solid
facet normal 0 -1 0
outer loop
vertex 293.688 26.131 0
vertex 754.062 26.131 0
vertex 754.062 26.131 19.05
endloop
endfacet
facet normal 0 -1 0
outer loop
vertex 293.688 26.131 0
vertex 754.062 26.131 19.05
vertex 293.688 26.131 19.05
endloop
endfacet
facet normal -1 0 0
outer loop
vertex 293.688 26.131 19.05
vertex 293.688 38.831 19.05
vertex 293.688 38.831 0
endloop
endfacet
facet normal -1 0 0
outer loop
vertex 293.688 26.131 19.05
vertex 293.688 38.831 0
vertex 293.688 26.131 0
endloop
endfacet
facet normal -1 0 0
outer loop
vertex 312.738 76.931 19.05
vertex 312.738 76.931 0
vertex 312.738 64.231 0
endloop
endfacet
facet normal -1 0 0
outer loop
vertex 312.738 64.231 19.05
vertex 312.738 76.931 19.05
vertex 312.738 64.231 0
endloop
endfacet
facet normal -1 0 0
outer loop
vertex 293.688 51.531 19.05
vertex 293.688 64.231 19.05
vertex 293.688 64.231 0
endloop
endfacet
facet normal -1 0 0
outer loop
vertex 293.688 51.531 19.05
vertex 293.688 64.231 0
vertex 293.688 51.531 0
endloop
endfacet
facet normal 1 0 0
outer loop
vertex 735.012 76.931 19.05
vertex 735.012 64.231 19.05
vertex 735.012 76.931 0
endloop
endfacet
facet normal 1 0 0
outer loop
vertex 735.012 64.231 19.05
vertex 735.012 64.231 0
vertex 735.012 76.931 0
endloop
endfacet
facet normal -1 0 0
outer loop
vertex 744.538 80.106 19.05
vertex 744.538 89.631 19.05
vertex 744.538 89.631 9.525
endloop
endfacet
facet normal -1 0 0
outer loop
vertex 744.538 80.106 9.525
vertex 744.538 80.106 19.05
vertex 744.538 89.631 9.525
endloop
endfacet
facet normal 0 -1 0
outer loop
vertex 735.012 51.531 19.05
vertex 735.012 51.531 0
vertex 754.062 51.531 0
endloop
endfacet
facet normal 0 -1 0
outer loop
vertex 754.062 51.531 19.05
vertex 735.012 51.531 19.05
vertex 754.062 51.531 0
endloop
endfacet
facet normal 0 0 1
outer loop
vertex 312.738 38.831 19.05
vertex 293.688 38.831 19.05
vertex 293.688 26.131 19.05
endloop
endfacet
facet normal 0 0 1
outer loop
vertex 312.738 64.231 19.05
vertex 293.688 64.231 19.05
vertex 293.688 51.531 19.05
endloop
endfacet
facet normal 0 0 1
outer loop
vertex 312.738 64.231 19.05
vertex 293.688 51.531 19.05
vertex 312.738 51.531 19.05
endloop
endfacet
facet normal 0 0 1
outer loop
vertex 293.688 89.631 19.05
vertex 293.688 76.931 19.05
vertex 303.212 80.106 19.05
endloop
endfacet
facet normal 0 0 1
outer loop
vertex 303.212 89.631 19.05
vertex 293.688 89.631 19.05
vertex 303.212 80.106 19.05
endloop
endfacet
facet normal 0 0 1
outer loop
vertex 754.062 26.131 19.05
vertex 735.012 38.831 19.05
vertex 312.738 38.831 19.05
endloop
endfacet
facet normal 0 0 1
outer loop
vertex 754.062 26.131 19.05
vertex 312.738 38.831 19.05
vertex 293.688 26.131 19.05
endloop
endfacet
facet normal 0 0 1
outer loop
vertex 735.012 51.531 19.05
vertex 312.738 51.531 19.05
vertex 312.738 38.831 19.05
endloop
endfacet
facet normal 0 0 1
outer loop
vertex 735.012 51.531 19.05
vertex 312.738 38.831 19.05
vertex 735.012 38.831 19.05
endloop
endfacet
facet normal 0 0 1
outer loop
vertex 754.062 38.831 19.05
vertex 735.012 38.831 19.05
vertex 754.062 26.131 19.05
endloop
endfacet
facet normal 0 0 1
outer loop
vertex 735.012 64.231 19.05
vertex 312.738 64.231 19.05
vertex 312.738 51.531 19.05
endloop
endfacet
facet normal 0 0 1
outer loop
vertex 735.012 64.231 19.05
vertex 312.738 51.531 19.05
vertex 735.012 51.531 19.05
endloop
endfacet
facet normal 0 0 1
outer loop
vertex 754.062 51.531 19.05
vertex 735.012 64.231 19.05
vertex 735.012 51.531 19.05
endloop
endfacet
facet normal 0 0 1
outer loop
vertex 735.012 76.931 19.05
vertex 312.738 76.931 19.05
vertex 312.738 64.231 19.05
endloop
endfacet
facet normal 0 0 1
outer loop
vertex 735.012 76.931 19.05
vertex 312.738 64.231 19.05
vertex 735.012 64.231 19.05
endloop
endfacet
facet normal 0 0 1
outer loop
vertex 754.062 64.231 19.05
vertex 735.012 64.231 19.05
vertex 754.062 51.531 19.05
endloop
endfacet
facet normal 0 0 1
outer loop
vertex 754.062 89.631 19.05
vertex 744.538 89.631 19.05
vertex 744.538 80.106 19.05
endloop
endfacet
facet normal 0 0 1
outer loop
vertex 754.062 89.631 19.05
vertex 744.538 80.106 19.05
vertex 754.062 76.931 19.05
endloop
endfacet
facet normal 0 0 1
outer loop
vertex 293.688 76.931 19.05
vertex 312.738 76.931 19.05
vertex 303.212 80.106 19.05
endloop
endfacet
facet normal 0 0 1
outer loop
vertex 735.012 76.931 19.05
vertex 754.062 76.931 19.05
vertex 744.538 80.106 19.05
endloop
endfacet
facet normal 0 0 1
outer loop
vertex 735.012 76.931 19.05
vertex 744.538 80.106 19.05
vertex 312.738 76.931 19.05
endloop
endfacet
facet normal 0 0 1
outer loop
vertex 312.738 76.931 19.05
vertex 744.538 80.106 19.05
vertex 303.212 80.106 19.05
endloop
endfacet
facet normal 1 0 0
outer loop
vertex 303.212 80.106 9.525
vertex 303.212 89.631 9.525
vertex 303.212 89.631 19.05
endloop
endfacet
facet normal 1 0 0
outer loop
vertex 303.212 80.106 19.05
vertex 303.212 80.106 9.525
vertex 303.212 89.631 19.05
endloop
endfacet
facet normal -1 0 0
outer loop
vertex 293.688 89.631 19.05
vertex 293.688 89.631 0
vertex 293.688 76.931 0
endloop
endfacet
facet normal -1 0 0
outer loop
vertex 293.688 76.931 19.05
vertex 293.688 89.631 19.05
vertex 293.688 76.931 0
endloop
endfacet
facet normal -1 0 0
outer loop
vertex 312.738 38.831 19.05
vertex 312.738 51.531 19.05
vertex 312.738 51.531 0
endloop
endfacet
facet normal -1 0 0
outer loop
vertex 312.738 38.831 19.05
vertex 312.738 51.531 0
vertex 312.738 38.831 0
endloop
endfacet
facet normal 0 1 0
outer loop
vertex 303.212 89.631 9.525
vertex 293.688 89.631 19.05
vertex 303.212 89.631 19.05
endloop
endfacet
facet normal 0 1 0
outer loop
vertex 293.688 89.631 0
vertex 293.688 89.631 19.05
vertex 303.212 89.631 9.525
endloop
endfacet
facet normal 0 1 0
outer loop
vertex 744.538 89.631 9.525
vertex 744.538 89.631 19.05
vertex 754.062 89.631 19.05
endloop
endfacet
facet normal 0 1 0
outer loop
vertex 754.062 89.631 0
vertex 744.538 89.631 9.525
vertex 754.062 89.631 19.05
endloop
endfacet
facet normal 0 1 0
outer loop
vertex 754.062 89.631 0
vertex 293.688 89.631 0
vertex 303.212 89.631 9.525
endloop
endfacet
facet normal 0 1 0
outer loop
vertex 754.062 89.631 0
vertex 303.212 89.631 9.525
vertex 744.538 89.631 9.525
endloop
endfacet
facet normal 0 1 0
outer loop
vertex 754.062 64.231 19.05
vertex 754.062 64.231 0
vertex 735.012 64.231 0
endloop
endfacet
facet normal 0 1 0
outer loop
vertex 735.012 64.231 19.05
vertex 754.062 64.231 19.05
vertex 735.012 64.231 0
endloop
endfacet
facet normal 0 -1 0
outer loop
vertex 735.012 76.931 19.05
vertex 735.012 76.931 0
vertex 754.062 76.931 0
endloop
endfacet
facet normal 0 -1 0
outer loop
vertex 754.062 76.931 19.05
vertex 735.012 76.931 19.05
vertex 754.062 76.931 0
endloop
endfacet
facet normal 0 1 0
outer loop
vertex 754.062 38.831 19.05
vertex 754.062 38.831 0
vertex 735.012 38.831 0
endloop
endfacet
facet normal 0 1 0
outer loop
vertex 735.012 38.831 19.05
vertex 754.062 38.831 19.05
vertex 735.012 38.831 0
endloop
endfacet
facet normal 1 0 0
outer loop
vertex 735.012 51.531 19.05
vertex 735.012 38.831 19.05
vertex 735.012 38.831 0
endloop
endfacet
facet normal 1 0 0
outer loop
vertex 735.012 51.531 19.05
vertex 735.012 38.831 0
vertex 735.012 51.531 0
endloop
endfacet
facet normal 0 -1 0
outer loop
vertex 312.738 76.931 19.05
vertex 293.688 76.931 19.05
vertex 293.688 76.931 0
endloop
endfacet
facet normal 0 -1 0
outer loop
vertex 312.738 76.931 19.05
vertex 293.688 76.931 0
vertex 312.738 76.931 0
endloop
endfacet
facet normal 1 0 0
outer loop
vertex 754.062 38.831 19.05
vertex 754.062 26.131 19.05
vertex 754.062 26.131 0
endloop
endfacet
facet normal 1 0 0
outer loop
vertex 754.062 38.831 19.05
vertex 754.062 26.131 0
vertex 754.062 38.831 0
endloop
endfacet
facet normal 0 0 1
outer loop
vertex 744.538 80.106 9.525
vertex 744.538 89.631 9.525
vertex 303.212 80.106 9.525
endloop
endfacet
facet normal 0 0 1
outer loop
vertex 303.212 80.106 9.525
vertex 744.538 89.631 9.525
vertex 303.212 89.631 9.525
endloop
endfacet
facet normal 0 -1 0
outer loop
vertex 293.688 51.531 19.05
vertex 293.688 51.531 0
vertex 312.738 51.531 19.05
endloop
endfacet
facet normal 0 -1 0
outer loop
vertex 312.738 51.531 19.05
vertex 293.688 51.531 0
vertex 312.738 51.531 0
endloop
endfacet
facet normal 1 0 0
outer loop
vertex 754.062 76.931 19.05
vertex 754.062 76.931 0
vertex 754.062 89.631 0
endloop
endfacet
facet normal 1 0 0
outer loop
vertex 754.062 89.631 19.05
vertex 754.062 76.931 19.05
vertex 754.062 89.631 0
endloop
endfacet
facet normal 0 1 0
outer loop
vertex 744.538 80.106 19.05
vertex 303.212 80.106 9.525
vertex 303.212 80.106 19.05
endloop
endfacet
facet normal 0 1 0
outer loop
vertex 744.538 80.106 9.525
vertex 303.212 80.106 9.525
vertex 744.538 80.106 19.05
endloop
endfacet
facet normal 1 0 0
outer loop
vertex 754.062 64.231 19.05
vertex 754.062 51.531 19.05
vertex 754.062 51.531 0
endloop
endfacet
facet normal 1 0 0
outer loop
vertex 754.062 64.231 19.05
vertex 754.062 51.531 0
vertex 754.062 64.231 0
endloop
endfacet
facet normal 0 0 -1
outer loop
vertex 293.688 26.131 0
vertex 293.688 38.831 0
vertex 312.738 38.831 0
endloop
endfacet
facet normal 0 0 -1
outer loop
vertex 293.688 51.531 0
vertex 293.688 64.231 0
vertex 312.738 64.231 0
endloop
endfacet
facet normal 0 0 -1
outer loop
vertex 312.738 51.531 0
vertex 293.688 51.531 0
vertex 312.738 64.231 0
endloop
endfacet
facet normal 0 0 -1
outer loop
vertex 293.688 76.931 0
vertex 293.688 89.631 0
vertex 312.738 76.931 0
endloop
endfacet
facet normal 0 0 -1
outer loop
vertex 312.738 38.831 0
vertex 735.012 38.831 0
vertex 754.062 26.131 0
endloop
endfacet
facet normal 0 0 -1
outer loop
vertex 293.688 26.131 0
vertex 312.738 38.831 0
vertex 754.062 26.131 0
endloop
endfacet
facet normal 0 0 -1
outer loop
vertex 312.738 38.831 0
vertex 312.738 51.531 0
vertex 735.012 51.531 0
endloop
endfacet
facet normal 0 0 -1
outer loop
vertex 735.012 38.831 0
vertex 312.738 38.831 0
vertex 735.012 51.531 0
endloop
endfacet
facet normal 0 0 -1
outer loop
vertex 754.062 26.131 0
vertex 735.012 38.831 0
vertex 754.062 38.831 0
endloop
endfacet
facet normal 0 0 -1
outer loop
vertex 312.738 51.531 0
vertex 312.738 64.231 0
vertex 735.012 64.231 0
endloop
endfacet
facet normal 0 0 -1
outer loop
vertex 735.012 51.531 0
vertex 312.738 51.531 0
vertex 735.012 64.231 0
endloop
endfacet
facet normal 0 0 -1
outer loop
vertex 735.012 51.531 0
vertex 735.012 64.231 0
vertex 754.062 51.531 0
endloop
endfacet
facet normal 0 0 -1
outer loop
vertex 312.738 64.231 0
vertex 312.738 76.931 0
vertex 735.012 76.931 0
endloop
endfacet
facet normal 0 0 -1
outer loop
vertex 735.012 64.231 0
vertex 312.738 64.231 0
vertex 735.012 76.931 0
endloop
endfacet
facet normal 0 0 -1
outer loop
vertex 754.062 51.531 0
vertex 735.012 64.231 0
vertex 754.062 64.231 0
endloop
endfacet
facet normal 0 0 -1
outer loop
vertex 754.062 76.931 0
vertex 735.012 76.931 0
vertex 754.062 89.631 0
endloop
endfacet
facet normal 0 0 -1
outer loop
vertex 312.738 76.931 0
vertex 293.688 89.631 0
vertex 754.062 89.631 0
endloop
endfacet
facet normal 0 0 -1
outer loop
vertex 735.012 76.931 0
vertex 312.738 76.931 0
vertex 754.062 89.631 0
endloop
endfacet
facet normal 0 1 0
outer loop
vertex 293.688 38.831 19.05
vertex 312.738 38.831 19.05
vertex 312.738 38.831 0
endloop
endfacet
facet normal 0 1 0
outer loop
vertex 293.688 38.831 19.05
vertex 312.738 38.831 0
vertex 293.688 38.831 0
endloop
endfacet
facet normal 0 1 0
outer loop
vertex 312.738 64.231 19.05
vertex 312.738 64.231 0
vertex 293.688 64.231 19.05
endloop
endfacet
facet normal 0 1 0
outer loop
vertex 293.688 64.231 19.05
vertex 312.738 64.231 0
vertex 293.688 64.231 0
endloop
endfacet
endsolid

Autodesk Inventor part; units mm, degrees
ref_plane "YZ Plane" through (0, 0, 0) normal (1, 0, 0) x (0, 1, 0)
ref_plane "XZ Plane" through (0, 0, 0) normal (0, 1, 0) x (-1, 0, 0)
ref_plane "XY Plane" through (0, 0, 0) normal (0, 0, 1) x (1, 0, 0)
sketch "Sketch1" plane through (0, 0, 0) normal (0, 0, 1) x (1, 0, 0)
  line L0 (293.6875, 89.6306) -> (523.875, 89.6306)
  line L1 (523.875, 89.6306) -> (523.875, 26.1306)
  line L2 (523.875, 26.1306) -> (293.6875, 26.1306)
  line L3 (293.6875, 89.6306) -> (293.6875, 76.9306)
  line L4 (293.6875, 76.9306) -> (274.6375, 76.9306)
  line L5 (274.6375, 76.9306) -> (274.6375, 64.2306)
  line L6 (274.6375, 64.2306) -> (293.6875, 64.2306)
  line L7 (293.6875, 64.2306) -> (293.6875, 51.5306)
  line L8 (293.6875, 51.5306) -> (274.6375, 51.5306)
  line L9 (274.6375, 51.5306) -> (274.6375, 38.8306)
  line L10 (274.6375, 38.8306) -> (293.6875, 38.8306)
  line L11 (293.6875, 38.8306) -> (293.6875, 26.1306)
  line L12 (293.6875, 76.9306) -> (312.7375, 76.9306)
  line L13 (312.7375, 76.9306) -> (312.7375, 64.2306)
  line L14 (312.7375, 64.2306) -> (293.6875, 64.2306)
  line L15 (293.6875, 51.5306) -> (312.7375, 51.5306)
  line L16 (312.7375, 51.5306) -> (312.7375, 38.8306)
  line L17 (312.7375, 38.8306) -> (293.6875, 38.8306)
  point P0 (0, 0)
  dimension "d4" = 63.5
  dimension "d17" = 230.1875
  dimension "d18" = 19.05
  dimension "d19" = 12.7
  dimension "d20" = 12.7
  dimension "d21" = 12.7
  dimension "d22" = 12.7
  dimension "d23" = 12.7
  dimension "d24" = 0
  dimension "d28" = 0
extrude "Extrusion4" add sketch "Sketch1" along normal blind 19.05 contours L0 L1 L2 L11 L17 L16 L15 L7 L14 L13 L12 L3
mirror "Mirror2" about plane through (523.875, 26.1306, 0) normal (1, 0, 0) of "Extrusion4"
sketch "Sketch4" plane through (293.6875, 89.6306, 19.05) normal (0, 1, 0) x (1, 0, 0)
  line L0 (0, 19.05) -> (0, 0) projected
  line L1 (0, 0) -> (460.375, 0) projected
  line L2 (460.375, 19.05) -> (460.375, 0) projected
  line L3 (9.525, 0) -> (450.85, 0)
  line L4 (450.85, 0) -> (450.85, 9.525)
  line L5 (450.85, 9.525) -> (9.525, 9.525)
  line L6 (9.525, 9.525) -> (9.525, 0)
  point P0 (-293.6875, 19.05)
  dimension "d32" = 9.525
  dimension "d34" = 9.525
extrude "Extrusion5" cut sketch "Sketch4" against normal blind 9.525
properties part number "top_cover_side" material "Wood (Birch)"
